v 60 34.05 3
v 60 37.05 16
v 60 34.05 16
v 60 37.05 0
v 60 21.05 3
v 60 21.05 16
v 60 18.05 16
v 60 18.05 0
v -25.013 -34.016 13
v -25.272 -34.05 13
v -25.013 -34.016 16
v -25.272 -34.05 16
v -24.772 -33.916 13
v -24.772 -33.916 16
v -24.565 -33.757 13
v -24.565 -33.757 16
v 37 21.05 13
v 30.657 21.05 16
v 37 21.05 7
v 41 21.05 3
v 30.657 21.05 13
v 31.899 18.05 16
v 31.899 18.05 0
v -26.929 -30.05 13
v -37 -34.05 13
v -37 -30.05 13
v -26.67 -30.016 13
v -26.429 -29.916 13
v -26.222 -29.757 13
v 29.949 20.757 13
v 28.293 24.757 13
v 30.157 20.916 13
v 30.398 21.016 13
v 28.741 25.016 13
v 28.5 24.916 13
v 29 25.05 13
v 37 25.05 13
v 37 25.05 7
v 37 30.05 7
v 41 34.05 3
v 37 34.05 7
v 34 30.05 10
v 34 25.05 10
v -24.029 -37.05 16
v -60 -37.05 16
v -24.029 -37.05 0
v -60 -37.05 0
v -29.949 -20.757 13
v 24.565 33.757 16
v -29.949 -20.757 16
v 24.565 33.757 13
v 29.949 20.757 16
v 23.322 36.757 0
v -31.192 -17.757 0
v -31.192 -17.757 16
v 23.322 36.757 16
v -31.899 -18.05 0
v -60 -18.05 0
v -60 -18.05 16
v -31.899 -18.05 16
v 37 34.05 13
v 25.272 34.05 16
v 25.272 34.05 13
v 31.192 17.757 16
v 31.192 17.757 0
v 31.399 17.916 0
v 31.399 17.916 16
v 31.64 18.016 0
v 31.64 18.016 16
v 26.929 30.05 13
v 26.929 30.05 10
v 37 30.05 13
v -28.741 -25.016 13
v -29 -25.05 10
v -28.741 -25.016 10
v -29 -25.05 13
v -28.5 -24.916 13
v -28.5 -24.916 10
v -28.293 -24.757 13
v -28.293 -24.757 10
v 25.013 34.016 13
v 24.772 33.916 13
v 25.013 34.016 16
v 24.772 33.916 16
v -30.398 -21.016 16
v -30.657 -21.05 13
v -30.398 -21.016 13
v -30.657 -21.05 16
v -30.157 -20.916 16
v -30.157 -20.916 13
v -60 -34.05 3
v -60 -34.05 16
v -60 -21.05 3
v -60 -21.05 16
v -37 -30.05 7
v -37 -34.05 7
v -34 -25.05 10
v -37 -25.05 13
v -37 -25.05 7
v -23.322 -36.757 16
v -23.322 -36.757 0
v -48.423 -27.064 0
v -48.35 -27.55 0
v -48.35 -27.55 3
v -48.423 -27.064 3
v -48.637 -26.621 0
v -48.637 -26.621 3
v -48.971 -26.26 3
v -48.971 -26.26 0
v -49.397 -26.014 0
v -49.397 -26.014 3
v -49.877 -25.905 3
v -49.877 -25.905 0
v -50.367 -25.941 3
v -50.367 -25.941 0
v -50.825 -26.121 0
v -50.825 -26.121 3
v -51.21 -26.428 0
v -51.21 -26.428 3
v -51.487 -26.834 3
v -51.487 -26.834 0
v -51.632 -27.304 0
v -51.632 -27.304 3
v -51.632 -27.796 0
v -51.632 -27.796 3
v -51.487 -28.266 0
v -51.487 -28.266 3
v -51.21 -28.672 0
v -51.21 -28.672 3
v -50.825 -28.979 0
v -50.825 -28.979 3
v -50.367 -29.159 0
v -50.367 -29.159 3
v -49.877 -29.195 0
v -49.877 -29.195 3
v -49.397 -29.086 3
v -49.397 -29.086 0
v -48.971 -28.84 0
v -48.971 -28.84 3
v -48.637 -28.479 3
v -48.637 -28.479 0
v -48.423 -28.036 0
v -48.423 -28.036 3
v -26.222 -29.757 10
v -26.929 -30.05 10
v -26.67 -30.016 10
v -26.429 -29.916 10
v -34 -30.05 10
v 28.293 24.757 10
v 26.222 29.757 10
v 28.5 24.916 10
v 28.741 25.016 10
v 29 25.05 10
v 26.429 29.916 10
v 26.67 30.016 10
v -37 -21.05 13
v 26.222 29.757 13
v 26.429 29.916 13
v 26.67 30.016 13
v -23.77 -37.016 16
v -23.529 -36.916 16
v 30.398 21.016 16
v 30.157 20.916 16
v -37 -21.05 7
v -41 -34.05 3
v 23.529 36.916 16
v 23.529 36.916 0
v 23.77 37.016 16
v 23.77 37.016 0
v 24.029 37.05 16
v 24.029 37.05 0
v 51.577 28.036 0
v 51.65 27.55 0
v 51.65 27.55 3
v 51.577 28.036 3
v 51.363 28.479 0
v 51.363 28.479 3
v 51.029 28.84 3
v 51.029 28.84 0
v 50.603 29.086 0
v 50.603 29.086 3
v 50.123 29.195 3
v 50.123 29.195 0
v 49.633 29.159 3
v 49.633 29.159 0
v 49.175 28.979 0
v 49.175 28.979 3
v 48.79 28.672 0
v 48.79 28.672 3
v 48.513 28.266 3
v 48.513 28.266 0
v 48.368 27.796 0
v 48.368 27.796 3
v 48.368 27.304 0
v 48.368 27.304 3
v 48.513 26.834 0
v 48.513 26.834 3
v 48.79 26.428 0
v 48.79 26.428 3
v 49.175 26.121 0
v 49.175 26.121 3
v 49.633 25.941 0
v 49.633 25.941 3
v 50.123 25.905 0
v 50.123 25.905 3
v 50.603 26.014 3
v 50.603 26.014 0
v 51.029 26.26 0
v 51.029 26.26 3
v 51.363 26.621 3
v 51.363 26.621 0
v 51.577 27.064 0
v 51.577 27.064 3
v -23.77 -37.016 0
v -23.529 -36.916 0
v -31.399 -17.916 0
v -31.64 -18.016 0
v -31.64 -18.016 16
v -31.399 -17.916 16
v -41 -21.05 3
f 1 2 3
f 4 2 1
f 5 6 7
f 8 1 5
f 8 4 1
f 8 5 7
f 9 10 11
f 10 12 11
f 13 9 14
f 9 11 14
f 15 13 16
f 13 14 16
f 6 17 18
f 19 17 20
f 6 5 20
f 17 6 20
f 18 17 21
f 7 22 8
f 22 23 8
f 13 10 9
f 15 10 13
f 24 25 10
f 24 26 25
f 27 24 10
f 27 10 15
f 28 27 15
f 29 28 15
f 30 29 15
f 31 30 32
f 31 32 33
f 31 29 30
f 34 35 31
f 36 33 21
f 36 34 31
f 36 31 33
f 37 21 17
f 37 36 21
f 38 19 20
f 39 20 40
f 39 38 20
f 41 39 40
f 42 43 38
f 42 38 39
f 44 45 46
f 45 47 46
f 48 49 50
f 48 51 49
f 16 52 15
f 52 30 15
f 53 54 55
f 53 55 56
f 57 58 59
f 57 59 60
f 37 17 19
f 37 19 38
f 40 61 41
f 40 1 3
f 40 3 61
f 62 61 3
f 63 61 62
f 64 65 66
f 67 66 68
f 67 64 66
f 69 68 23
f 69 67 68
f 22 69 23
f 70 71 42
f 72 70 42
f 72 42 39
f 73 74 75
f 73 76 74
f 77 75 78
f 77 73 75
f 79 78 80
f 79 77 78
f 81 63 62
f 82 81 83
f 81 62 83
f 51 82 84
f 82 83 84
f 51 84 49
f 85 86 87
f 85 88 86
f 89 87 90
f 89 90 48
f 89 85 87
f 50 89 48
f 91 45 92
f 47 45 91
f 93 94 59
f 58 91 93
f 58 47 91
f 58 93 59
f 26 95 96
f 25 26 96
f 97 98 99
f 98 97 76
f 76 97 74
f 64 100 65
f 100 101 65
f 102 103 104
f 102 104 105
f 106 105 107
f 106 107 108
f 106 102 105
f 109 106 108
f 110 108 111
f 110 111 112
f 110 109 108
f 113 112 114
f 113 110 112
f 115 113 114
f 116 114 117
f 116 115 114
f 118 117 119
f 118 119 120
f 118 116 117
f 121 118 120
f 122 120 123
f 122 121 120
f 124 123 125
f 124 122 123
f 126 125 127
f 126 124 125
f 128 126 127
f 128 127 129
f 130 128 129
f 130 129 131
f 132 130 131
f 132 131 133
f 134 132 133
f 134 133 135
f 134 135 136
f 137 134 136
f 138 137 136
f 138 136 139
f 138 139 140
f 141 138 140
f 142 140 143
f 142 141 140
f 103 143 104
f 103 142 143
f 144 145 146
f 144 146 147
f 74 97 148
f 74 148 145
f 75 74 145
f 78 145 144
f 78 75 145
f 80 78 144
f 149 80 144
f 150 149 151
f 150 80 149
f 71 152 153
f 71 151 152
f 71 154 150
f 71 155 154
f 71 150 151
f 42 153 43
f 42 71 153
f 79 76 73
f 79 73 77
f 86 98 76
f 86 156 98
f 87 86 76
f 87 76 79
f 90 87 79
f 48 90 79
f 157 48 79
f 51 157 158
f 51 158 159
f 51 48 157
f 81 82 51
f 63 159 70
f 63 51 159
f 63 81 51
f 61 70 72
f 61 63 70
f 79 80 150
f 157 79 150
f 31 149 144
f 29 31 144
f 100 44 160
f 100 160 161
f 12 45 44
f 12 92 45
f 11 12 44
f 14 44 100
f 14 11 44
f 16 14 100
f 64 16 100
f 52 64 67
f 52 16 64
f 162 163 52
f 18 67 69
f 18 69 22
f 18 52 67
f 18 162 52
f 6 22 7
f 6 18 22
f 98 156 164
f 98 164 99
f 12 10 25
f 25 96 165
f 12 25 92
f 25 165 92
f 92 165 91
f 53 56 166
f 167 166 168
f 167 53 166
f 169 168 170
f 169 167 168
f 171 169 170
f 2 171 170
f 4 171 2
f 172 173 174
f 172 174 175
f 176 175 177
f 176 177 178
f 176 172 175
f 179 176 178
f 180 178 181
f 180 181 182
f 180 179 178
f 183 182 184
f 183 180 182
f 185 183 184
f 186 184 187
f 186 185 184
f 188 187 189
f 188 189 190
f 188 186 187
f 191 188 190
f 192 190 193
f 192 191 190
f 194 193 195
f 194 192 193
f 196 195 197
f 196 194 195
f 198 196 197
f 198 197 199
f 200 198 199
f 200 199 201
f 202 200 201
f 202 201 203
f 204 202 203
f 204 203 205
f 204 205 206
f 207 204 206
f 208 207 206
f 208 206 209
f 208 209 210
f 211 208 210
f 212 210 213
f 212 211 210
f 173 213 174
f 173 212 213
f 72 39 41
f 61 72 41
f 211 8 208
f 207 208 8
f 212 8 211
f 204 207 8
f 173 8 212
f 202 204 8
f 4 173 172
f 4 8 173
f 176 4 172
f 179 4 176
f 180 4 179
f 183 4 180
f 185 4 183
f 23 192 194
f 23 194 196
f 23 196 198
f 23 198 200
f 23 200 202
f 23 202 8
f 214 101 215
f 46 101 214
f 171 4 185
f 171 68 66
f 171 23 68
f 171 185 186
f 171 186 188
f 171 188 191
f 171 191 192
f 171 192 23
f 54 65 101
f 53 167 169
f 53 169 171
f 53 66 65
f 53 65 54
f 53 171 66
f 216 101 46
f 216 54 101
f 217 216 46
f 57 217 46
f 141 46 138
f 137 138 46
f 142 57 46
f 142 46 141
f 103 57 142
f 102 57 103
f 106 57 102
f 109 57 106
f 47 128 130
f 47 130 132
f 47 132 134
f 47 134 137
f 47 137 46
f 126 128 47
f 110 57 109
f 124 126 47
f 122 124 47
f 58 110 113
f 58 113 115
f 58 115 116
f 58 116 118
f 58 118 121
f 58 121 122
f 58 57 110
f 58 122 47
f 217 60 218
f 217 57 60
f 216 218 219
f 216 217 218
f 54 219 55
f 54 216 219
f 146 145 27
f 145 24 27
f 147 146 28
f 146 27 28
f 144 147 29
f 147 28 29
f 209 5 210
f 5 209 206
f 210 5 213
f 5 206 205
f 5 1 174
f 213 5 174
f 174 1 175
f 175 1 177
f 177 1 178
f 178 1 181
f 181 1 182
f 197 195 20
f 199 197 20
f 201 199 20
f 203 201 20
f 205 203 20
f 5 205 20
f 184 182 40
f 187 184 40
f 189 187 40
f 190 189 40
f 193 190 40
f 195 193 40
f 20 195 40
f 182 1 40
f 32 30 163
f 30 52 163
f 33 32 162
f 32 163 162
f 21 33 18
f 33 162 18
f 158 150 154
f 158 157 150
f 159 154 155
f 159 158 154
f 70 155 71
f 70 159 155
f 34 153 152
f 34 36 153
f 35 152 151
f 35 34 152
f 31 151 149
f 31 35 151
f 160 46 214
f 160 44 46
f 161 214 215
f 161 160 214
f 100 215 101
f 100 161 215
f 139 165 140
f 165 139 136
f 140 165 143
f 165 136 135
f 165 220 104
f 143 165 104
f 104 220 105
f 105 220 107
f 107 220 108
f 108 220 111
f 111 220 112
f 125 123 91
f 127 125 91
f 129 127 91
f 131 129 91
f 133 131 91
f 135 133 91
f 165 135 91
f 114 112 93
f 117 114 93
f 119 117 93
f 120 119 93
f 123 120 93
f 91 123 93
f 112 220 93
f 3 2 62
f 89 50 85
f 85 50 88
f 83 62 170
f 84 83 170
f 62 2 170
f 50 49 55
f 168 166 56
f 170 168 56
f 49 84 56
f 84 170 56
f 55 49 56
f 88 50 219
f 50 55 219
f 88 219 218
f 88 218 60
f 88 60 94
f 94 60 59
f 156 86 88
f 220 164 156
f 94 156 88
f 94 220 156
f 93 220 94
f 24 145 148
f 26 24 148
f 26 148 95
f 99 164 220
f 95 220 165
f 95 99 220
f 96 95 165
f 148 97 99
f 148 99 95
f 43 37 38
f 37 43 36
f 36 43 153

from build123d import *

# Parameters (mm, degrees)
SKETCH_10_R     = 1.65
EXTRUDE_1_DEPTH = 3
EXTRUDE_START   = 3
EXTRUDE_2_DEPTH = 7
EXTRUDE_3_DEPTH = 13
CHAMFER_1_SIZE  = 7
EXTRUDE_5_DEPTH = 10
FILLET_1_R      = 1


with BuildPart() as part:
    # 草图10 → 凸台-拉伸1 (new body)
    with BuildSketch(Plane.XY):
        Polygon((-60, -18.05), (-31.485028843, -18.05), (23.614971157, 37.05), (60, 37.05), (60, 18.05), (31.485028843, 18.05), (-23.614971157, -37.05), (-60, -37.05), align=None)
        with Locations((-50, -27.55)):
            Circle(SKETCH_10_R, mode=Mode.SUBTRACT)
        with Locations((50, 27.55)):
            Circle(SKETCH_10_R, mode=Mode.SUBTRACT)
    extrude(amount=EXTRUDE_1_DEPTH)

    # 草图11 → 凸台-拉伸2 (add)
    with BuildSketch(Plane.XY.offset(EXTRUDE_START)):
        Polygon((-41, -18.05), (-41, -37.05), (-23.614971157, -37.05), (31.485028843, 18.05), (41, 18.05), (41, 37.05), (23.614971157, 37.05), (-31.485028843, -18.05), align=None)
    extrude(amount=EXTRUDE_2_DEPTH)

    # 草图12 → 凸台-拉伸3 (add)
    with BuildSketch(Plane.XY.offset(EXTRUDE_START)):
        Polygon((-60, -18.05), (-31.485028843, -18.05), (23.614971157, 37.05), (60, 37.05), (60, 34.05), (24.857611845, 34.05), (-30.242388155, -21.05), (-60, -21.05), align=None)
        Polygon((-60, -34.05), (-60, -37.05), (-23.614971157, -37.05), (31.485028843, 18.05), (60, 18.05), (60, 21.05), (30.242388155, 21.05), (-24.857611845, -34.05), align=None)
    extrude(amount=EXTRUDE_3_DEPTH)

    # 倒角1
    chamfer_1_edges = [part.edges().sort_by_distance(p)[0] for p in [
        (41, 27.55, 10),
        (-41, -27.55, 10),
    ]]
    chamfer(chamfer_1_edges, length=CHAMFER_1_SIZE - 0.0001)  # a hair under: the kernel refuses the full size

    # 草图15 → 凸台-拉伸5 (add)
    with BuildSketch(Plane.XY.offset(3)):
        Polygon((-37, -21.05), (-37, -25.05), (-28.585533906, -25.05), (26.514466094, 30.05), (37, 30.05), (37, 34.05), (24.857611845, 34.05), (-30.242388155, -21.05), align=None)
        Polygon((-37, -30.05), (-37, -34.05), (-24.857611845, -34.05), (30.242388155, 21.05), (37, 21.05), (37, 25.05), (28.585533906, 25.05), (-26.514466094, -30.05), align=None)
    extrude(amount=EXTRUDE_5_DEPTH)

    # 圆角1
    fillet_1_edges = [part.edges().sort_by_distance(p)[0] for p in [
        (-31.485028843, -18.05, 8),
        (23.614971157, 37.05, 8),
        (31.485028843, 18.05, 8),
        (-23.614971157, -37.05, 8),
        (-28.585533906, -25.05, 11.5),
        (26.514466094, 30.05, 11.5),
        (-26.514466094, -30.05, 11.5),
        (28.585533906, 25.05, 11.5),
        (24.857611845, 34.05, 14.5),
        (-30.242388155, -21.05, 14.5),
        (-24.857611845, -34.05, 14.5),
        (30.242388155, 21.05, 14.5),
    ]]
    fillet(fillet_1_edges, radius=FILLET_1_R)


solid = part.part
